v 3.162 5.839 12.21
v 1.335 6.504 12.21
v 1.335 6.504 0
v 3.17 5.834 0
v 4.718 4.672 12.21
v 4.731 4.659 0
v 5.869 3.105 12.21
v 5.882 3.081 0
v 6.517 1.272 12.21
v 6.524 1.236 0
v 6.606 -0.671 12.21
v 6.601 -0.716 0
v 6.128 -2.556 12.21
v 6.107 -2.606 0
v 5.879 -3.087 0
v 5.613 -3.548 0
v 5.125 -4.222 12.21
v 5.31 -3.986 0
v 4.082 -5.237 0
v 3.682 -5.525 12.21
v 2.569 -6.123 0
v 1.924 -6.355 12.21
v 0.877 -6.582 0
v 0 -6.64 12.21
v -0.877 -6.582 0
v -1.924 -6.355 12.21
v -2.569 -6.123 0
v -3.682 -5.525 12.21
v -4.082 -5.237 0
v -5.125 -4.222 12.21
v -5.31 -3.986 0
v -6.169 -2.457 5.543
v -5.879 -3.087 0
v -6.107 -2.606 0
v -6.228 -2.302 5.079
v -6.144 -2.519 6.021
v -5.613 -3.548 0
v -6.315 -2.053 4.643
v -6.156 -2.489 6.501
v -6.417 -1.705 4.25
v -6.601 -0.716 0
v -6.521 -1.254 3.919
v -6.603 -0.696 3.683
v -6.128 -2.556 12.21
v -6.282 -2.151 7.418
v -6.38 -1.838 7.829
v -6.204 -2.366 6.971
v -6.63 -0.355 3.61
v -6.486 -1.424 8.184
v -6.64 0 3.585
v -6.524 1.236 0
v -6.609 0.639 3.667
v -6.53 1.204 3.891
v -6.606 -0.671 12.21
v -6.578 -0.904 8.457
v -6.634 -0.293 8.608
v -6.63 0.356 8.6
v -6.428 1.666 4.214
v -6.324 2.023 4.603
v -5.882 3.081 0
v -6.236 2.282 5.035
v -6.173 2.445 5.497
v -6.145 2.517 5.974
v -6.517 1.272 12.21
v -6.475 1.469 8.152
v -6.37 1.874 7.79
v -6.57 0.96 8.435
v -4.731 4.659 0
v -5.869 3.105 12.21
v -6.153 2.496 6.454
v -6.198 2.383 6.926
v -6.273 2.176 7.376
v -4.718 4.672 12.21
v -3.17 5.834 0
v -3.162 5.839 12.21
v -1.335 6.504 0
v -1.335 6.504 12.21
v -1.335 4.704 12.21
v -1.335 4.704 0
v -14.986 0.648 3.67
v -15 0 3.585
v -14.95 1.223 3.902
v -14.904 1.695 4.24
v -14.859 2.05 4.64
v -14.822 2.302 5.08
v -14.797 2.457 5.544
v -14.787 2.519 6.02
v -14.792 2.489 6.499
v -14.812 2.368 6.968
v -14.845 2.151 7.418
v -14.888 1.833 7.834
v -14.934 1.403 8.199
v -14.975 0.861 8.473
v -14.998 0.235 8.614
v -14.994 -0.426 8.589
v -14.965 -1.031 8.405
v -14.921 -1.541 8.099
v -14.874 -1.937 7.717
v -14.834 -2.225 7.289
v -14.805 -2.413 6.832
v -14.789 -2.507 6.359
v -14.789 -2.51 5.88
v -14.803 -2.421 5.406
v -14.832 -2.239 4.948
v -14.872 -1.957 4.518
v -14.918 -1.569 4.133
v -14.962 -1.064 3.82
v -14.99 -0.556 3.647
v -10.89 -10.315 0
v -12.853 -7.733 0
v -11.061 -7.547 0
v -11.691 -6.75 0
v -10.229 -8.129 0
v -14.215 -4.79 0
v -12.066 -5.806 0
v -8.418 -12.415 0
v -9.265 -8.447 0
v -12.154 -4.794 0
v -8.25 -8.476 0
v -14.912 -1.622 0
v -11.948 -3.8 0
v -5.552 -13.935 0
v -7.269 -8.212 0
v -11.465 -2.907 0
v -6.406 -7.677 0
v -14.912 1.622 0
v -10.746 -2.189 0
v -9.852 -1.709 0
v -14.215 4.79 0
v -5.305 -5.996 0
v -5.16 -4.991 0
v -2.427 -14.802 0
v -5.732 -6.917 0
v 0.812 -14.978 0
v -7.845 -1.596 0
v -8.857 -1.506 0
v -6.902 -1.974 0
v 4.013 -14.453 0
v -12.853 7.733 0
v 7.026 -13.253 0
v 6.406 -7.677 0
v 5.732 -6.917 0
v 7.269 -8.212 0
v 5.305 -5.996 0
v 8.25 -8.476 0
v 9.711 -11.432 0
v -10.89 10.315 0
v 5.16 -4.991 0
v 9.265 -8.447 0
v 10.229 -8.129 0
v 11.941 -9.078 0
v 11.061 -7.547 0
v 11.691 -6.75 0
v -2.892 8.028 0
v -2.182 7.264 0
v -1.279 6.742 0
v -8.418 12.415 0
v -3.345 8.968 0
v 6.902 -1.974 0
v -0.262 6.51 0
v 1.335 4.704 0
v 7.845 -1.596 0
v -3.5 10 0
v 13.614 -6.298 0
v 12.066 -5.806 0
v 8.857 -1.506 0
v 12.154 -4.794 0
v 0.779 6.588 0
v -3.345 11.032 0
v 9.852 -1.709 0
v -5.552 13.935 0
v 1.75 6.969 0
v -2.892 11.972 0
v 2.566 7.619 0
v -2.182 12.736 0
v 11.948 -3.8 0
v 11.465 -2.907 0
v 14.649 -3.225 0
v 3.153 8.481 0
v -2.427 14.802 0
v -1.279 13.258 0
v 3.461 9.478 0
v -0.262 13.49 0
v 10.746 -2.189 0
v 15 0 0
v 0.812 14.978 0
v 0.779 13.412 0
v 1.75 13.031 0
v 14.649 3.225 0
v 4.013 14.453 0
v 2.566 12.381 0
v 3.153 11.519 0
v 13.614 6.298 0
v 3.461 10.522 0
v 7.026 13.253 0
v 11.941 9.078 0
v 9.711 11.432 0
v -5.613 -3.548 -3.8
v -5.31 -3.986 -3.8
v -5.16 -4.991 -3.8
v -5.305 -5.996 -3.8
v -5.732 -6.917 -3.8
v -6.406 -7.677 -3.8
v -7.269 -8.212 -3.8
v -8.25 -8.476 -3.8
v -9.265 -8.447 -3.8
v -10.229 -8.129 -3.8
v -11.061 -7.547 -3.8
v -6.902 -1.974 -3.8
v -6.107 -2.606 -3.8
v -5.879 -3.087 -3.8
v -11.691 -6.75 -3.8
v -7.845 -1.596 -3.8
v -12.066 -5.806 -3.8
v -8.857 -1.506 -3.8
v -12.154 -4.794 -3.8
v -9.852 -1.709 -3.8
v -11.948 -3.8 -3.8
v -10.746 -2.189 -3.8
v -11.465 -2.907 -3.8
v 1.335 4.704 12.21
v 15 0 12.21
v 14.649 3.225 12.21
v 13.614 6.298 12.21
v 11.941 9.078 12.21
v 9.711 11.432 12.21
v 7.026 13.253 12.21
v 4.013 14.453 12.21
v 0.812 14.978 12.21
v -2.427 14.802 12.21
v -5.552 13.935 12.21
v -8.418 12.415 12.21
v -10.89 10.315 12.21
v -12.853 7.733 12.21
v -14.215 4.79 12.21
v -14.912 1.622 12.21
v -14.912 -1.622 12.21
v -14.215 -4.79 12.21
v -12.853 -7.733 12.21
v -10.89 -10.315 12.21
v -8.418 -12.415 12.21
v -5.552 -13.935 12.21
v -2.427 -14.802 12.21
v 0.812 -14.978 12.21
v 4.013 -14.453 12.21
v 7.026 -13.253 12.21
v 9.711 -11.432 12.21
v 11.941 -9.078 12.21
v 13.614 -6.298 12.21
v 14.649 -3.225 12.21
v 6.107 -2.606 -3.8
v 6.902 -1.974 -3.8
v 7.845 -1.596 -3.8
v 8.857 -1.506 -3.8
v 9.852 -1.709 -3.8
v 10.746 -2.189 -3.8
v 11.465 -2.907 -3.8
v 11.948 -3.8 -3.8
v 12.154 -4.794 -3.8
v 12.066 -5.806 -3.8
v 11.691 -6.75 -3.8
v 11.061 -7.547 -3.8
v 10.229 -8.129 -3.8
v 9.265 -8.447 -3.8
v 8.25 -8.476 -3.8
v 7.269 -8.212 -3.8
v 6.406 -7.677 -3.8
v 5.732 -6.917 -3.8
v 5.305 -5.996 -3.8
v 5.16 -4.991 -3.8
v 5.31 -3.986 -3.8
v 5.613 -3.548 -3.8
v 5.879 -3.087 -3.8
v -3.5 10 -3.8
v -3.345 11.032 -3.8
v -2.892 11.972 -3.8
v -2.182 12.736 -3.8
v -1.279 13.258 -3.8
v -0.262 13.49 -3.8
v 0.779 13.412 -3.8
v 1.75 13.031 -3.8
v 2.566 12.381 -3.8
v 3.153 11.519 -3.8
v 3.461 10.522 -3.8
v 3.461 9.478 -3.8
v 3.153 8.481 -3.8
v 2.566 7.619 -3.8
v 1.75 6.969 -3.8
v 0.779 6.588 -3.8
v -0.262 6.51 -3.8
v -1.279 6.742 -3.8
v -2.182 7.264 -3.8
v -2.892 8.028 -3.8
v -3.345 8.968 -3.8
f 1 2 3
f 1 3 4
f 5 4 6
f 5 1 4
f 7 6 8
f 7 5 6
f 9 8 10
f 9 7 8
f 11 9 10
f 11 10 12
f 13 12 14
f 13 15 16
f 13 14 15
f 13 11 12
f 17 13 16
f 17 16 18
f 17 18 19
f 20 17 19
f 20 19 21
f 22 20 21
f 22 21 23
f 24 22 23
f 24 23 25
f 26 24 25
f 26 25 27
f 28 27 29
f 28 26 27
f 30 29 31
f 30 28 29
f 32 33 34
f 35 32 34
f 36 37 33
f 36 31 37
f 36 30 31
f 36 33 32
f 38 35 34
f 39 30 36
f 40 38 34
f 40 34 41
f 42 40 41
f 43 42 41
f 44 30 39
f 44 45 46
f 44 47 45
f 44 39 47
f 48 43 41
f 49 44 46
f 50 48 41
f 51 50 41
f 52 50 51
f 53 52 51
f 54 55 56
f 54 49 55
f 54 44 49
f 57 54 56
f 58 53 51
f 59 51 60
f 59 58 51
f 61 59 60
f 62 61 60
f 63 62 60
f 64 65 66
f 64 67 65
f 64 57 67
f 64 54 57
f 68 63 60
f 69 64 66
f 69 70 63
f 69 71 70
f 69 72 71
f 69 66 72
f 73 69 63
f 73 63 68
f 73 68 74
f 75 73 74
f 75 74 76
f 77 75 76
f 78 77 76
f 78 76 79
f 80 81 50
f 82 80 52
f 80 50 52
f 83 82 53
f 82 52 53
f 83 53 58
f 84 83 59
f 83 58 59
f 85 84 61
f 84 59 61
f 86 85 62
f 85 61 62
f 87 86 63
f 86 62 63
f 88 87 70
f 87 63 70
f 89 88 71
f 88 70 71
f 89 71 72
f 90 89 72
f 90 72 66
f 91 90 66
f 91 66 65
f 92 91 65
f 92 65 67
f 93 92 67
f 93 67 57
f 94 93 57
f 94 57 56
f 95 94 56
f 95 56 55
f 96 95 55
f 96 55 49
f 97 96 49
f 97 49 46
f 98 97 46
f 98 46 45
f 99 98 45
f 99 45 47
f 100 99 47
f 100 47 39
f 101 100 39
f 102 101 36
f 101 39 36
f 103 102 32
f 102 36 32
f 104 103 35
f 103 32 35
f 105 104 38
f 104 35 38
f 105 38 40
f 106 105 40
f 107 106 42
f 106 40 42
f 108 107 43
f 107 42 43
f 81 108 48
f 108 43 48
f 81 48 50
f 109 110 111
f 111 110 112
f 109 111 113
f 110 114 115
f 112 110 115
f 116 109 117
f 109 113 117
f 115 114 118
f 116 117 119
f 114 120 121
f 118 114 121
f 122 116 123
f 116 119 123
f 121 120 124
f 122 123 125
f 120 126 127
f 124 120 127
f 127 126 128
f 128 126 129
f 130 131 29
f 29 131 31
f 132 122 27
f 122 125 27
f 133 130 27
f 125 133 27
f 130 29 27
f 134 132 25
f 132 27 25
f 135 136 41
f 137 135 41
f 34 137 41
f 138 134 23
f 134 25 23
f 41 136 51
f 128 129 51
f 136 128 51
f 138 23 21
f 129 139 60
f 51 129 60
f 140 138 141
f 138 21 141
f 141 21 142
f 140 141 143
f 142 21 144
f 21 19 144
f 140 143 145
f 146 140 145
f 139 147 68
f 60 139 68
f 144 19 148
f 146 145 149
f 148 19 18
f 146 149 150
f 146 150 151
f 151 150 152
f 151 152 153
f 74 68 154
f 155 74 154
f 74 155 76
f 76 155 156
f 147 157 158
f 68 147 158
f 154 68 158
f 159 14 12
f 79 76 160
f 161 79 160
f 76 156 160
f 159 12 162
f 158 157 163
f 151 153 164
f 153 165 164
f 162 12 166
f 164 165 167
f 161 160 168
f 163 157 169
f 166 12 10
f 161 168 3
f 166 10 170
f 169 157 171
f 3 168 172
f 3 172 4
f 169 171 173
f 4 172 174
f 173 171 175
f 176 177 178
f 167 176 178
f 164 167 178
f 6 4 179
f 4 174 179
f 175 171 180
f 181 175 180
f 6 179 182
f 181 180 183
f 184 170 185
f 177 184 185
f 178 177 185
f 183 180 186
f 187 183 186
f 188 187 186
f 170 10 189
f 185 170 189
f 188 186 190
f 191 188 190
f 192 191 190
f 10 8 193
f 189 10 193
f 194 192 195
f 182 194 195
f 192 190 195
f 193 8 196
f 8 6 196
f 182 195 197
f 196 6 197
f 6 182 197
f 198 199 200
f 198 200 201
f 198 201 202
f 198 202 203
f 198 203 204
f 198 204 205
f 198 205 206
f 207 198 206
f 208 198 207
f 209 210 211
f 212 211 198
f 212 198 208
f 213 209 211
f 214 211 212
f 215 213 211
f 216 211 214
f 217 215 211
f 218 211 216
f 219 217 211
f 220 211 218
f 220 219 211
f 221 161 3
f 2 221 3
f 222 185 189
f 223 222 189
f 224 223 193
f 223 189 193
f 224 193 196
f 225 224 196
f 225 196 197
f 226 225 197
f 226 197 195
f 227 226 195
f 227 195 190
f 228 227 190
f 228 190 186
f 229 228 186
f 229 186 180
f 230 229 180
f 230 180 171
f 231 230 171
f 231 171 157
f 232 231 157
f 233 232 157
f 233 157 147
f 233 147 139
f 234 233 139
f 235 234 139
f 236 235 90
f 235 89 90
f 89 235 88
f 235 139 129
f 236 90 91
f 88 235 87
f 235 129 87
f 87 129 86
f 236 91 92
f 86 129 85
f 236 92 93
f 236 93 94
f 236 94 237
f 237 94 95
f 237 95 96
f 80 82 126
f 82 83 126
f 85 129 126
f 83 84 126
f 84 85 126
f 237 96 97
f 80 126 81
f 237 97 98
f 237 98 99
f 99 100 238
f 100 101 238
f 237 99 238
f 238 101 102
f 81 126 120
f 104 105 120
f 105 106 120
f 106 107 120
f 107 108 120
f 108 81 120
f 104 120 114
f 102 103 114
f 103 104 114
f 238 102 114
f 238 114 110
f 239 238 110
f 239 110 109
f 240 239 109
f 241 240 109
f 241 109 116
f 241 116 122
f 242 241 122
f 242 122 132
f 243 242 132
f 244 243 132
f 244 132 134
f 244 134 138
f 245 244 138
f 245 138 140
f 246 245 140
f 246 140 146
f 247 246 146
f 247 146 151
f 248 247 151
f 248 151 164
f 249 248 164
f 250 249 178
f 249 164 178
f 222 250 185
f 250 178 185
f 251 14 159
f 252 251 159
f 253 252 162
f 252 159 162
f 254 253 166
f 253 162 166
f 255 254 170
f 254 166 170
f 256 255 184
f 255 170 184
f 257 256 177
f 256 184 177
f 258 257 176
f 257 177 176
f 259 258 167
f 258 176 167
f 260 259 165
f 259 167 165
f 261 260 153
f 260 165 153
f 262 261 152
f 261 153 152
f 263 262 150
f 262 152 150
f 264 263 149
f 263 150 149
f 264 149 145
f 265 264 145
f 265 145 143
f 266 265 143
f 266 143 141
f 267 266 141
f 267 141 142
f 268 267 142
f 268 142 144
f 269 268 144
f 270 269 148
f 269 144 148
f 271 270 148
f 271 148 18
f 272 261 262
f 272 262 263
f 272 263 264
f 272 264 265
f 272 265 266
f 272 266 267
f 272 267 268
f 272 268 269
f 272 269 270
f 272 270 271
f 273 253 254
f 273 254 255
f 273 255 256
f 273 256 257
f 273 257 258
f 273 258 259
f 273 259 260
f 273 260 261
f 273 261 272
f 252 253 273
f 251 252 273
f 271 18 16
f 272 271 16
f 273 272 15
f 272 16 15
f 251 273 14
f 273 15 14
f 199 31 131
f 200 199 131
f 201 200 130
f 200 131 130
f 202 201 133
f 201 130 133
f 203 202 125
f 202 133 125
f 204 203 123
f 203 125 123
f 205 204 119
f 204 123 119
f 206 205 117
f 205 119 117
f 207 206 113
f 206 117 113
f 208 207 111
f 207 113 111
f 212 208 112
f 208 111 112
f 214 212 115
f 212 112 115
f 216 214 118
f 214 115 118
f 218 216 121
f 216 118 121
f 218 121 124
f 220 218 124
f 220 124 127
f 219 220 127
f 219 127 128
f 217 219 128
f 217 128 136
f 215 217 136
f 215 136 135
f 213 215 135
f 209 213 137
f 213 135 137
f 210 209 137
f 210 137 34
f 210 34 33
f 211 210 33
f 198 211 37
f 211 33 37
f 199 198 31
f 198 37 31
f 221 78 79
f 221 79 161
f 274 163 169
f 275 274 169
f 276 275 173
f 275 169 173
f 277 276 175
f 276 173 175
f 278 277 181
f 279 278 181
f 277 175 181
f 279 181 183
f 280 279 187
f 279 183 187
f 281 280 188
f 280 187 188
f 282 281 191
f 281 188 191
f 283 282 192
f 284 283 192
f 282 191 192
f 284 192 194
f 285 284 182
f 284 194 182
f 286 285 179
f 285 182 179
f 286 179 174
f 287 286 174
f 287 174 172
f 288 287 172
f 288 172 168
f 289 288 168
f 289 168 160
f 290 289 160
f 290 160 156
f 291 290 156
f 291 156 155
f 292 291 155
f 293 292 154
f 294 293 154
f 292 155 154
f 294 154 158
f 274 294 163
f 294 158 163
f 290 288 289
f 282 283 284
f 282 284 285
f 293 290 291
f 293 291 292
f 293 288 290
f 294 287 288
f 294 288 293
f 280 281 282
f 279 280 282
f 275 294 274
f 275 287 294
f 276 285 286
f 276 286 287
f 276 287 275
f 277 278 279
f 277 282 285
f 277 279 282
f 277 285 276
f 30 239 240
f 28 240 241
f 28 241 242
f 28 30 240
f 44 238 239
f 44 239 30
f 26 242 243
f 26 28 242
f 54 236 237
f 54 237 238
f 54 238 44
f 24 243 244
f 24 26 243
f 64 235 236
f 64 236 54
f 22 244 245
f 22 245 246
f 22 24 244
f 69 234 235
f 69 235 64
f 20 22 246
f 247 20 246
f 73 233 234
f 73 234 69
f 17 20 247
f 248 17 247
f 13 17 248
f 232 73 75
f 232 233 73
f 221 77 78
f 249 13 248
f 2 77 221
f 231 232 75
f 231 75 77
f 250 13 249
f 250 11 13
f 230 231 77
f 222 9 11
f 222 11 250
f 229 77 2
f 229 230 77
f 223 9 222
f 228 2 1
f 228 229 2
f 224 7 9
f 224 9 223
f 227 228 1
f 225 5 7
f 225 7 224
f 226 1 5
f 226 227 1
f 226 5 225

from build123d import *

# Parameters (mm, degrees)
GEARFACEPROFILE_R        = 15
GEARFACEEXTRUDE_DEPTH    = 12.21
CENTERSLOT_DEPTH         = 25.476194557
GEARCONNECTORS_OUTLINE_R = 3.5
GEARCONNECTORS_DEPTH     = 3.8
SETSCREWPROFILE_R        = 2.52
SETSCREWHOLE_DEPTH       = 25.476194557


# Read off the part's stored shape, not the designer's step: GearConnectors
with BuildPart() as part:
    # GearFaceProfile → GearFaceExtrude (new body)
    with BuildSketch(Plane.XY):
        Circle(GEARFACEPROFILE_R)
    extrude(amount=GEARFACEEXTRUDE_DEPTH)

    # Sketch1 → CenterSlot (cut, through all)
    with BuildSketch(Plane.XY.offset(12.21)):
        with BuildLine():
            Line((-1.335, 6.504411964), (-1.335, 4.704411964))
            Line((-1.335, 4.704411964), (1.335, 4.704411964))
            Line((1.335, 4.704411964), (1.335, 6.504411964))
            ThreePointArc((1.335, 6.504411964), (0, -6.64), (-1.335, 6.504411964))
        make_face()
    extrude(amount=-CENTERSLOT_DEPTH, mode=Mode.SUBTRACT)

    # GearConnectors outline → GearConnectors (add)
    with BuildSketch(Plane(origin=(0, 0, 0), x_dir=(-1, 0, 0), z_dir=(0, 0, -1))):
        with BuildLine():
            ThreePointArc((5.310262334, -3.986315836), (11.691342952, -6.749999998), (6.107381948, -2.605664164))
            ThreePointArc((6.107381948, -2.605664164), (5.750408681, -3.32), (5.310262334, -3.986315836))
        make_face()
        with BuildLine():
            ThreePointArc((-6.107381948, -2.605664164), (-11.691342952, -6.749999998), (-5.310262334, -3.986315836))
            ThreePointArc((-5.310262334, -3.986315836), (-5.750408681, -3.32), (-6.107381948, -2.605664164))
        make_face()
        with Locations((0, 10)):
            Circle(GEARCONNECTORS_OUTLINE_R)
    extrude(amount=GEARCONNECTORS_DEPTH)

    # SetScrewProfile → SetScrewHole (cut, through all)
    with BuildSketch(Plane(origin=(0, 0, 0), x_dir=(0, 0, -1), z_dir=(1, 0, 0))):
        with Locations((-6.105, 0)):
            Circle(SETSCREWPROFILE_R)
    extrude(amount=-SETSCREWHOLE_DEPTH, mode=Mode.SUBTRACT)


solid = part.part
